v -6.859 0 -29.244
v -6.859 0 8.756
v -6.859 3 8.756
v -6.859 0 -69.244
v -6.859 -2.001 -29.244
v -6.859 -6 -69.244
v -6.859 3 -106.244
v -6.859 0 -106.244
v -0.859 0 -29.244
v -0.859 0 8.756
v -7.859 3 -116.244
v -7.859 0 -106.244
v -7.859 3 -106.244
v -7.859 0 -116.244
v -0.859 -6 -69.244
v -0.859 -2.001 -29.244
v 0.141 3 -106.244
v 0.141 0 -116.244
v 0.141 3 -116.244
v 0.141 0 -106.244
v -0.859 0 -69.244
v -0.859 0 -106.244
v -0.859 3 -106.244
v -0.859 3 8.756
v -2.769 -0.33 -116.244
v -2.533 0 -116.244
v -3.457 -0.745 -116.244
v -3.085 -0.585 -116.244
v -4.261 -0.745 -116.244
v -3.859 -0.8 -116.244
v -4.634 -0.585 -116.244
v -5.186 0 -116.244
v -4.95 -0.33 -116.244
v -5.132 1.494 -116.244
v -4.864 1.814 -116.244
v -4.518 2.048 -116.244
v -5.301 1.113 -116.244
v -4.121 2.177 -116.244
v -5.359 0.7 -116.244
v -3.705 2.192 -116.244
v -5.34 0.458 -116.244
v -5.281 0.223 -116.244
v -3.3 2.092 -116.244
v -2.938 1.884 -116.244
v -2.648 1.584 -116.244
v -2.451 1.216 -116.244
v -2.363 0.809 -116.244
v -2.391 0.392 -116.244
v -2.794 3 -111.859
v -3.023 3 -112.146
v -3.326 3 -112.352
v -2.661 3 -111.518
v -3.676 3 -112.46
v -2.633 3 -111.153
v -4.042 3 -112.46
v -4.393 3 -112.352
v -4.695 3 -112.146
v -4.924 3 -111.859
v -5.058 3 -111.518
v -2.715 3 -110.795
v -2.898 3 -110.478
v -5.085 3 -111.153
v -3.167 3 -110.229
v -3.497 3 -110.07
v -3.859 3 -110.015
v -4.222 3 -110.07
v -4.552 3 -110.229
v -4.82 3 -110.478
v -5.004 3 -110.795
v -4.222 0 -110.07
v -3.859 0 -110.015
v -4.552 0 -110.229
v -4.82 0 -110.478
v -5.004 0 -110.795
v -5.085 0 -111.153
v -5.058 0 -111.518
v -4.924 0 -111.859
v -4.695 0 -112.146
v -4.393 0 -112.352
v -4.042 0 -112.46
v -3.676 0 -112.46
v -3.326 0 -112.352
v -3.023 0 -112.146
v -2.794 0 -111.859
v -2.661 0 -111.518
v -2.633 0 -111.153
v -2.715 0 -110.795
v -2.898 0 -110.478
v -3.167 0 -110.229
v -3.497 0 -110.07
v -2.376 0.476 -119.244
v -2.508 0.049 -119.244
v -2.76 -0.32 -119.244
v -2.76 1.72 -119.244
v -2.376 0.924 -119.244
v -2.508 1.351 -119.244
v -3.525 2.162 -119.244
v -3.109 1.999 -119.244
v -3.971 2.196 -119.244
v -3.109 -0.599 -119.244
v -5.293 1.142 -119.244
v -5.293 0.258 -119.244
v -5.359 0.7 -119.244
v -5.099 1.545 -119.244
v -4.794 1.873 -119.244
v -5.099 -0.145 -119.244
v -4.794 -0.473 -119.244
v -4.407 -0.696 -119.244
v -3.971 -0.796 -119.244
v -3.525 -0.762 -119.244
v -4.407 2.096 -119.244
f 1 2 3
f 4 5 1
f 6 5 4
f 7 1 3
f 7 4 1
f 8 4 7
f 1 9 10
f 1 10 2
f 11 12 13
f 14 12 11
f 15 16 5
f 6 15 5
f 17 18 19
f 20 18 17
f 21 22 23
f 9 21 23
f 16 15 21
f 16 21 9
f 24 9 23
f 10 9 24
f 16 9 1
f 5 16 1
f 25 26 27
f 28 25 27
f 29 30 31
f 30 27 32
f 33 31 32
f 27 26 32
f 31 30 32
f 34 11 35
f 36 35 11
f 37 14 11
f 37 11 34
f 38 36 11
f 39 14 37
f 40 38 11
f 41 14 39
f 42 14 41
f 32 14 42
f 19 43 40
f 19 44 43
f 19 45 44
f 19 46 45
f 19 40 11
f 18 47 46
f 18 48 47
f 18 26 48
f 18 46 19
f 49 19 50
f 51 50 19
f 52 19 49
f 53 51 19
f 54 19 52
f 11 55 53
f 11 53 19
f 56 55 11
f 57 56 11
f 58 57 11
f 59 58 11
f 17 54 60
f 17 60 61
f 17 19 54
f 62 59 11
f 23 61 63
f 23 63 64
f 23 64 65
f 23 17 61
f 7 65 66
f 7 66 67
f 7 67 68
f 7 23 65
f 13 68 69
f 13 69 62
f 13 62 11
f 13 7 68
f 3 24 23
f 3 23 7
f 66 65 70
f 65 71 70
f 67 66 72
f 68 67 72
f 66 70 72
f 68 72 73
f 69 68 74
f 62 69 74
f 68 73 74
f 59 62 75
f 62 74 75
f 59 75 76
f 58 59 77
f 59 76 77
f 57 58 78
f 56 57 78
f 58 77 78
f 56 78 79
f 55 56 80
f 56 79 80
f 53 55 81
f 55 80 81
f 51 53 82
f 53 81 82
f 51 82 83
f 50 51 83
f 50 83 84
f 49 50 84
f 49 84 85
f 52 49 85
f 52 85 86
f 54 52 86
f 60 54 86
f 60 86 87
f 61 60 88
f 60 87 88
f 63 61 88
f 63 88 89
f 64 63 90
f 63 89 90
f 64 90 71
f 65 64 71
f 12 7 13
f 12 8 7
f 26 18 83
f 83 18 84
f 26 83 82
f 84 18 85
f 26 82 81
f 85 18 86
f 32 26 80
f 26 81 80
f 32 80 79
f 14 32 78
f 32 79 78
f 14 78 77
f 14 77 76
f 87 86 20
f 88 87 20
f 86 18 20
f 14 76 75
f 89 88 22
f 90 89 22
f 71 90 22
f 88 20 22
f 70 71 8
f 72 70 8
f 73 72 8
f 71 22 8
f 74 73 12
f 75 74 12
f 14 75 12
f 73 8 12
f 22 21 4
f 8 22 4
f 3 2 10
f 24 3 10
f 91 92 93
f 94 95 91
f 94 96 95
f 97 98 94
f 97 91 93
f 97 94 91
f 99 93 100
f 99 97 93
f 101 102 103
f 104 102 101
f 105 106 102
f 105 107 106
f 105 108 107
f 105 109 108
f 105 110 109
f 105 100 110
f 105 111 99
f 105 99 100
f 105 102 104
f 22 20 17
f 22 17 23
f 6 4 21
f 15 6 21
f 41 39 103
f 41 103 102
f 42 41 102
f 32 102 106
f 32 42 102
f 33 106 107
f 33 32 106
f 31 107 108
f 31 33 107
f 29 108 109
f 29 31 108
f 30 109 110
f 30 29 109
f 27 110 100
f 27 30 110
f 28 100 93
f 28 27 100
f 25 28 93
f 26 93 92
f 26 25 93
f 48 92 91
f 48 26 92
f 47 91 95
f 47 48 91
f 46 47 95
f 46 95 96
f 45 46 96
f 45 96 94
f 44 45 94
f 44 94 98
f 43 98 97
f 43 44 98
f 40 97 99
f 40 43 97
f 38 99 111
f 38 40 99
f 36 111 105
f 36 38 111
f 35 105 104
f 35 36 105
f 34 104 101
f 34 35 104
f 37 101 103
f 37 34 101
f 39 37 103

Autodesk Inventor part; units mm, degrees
ref_plane "YZ Plane" through (0, 0, 0) normal (1, 0, 0) x (0, 1, 0)
ref_plane "XZ Plane" through (0, 0, 0) normal (0, 1, 0) x (-1, 0, 0)
ref_plane "XY Plane" through (0, 0, 0) normal (0, 0, 1) x (1, 0, 0)
sketch "Skizze1" plane through (0, 0, 0) normal (0, 1, 0) x (-1, 0, 0)
  line L0 (6.8592, -116.2444) -> (0.8592, -116.2444)
  line L1 (0.8592, -116.2444) -> (0.8592, 8.7556)
  line L2 (6.8592, 8.7556) -> (6.8592, -116.2444)
  line L3 (7.8592, -116.2444) -> (-0.1408, -116.2444)
  line L4 (-0.1408, -116.2444) -> (-0.1408, -106.2444)
  line L5 (-0.1408, -106.2444) -> (7.8592, -106.2444)
  line L6 (7.8592, -106.2444) -> (7.8592, -116.2444)
  line L7 (3.8592, 157.3916) -> (3.8592, -262.6084)
  line L8 (6.8592, 8.7556) -> (0.8592, 8.7556)
  point P0 (0, 0)
  point P1 (0.8592, -106.2444)
  point P2 (6.8592, -106.2444)
  point P3 (6.8592, -116.2444)
  point P4 (3.8592, -116.2444)
  dimension "d1" = 125
  dimension "d9" = 6
  dimension "d25" = 8
  dimension "d26" = 10
  dimension "d27" = 1
extrude "Extrusion1" add sketch "Skizze1" along normal blind 3
sketch "Skizze2" plane through (0, 3, 0) normal (0, 1, 0) x (1, 0, 0)
  line L0 (-3.8592, 111.2444) -> (-6.8592, 111.2444) construction
  line L1 (-3.8592, 111.2444) -> (-0.8592, 111.2444) construction
  line L2 (-0.8592, -8.7556) -> (-0.8592, 106.2444) construction
  line L3 (-6.8592, 106.2444) -> (-6.8592, -8.7556) construction
  line L4 (0.1408, 116.2444) -> (-7.8592, 116.2444) projected
  point P0 (0, 0)
  point P1 (-0.8592, 16.2444)
  point P2 (-6.8592, 16.2444)
  dimension "d28" = 5
hole "Bohrung1" at (-3.8592, 3, -111.2444) direction (0, -1, 0) diameter 2.459 end through all thread size "M3x0.5" class "6H" standard "ANSI Metric M Profile"
sketch "Skizze3" plane through (0.1408, 0, -116.2444) normal (0, 0, -1) x (-1, 0, 0)
  line L0 (4, 0) -> (4, 0.7)
  circle A0 centre (4, 0.7) radius 1.5
  line L1 (0, 0) -> (8, 0) projected
  point P0 (0.1408, 0)
  dimension "d29" = 3
  dimension "d30" = 0.7
extrude "Extrusion2" add sketch "Skizze3" along normal blind 3
sketch "Skizze4" plane through (0, 0, 0) normal (0, -1, 0) x (1, 0, 0)
  line L0 (-0.8592, 8.7556) -> (-0.8592, -106.2444) projected
  line L1 (-6.8592, -69.2444) -> (-0.8592, -69.2444)
  line L2 (-0.8592, -69.2444) -> (-0.8592, -29.2444)
  line L3 (-0.8592, -29.2444) -> (-6.8592, -29.2444)
  line L4 (-6.8592, -29.2444) -> (-6.8592, -69.2444)
  point P0 (0, 0)
  point P1 (-0.8592, -69.2444)
  point P2 (-6.8592, -106.2444)
  dimension "d34" = 40
  dimension "d37" = 37
  dimension "d38" = 6
extrude "Extrusion3" add sketch "Skizze4" along normal blind 6
chamfer "Fasen1" distance 40 distance2 4 1 edges at (-3.8592, -6, -29.2444) measured on face at (-4.8592, -6, -42.5778)
properties part number "SchubstangeA" material "PC/ABS-Kunststoff, 3DDruck, PLA"
